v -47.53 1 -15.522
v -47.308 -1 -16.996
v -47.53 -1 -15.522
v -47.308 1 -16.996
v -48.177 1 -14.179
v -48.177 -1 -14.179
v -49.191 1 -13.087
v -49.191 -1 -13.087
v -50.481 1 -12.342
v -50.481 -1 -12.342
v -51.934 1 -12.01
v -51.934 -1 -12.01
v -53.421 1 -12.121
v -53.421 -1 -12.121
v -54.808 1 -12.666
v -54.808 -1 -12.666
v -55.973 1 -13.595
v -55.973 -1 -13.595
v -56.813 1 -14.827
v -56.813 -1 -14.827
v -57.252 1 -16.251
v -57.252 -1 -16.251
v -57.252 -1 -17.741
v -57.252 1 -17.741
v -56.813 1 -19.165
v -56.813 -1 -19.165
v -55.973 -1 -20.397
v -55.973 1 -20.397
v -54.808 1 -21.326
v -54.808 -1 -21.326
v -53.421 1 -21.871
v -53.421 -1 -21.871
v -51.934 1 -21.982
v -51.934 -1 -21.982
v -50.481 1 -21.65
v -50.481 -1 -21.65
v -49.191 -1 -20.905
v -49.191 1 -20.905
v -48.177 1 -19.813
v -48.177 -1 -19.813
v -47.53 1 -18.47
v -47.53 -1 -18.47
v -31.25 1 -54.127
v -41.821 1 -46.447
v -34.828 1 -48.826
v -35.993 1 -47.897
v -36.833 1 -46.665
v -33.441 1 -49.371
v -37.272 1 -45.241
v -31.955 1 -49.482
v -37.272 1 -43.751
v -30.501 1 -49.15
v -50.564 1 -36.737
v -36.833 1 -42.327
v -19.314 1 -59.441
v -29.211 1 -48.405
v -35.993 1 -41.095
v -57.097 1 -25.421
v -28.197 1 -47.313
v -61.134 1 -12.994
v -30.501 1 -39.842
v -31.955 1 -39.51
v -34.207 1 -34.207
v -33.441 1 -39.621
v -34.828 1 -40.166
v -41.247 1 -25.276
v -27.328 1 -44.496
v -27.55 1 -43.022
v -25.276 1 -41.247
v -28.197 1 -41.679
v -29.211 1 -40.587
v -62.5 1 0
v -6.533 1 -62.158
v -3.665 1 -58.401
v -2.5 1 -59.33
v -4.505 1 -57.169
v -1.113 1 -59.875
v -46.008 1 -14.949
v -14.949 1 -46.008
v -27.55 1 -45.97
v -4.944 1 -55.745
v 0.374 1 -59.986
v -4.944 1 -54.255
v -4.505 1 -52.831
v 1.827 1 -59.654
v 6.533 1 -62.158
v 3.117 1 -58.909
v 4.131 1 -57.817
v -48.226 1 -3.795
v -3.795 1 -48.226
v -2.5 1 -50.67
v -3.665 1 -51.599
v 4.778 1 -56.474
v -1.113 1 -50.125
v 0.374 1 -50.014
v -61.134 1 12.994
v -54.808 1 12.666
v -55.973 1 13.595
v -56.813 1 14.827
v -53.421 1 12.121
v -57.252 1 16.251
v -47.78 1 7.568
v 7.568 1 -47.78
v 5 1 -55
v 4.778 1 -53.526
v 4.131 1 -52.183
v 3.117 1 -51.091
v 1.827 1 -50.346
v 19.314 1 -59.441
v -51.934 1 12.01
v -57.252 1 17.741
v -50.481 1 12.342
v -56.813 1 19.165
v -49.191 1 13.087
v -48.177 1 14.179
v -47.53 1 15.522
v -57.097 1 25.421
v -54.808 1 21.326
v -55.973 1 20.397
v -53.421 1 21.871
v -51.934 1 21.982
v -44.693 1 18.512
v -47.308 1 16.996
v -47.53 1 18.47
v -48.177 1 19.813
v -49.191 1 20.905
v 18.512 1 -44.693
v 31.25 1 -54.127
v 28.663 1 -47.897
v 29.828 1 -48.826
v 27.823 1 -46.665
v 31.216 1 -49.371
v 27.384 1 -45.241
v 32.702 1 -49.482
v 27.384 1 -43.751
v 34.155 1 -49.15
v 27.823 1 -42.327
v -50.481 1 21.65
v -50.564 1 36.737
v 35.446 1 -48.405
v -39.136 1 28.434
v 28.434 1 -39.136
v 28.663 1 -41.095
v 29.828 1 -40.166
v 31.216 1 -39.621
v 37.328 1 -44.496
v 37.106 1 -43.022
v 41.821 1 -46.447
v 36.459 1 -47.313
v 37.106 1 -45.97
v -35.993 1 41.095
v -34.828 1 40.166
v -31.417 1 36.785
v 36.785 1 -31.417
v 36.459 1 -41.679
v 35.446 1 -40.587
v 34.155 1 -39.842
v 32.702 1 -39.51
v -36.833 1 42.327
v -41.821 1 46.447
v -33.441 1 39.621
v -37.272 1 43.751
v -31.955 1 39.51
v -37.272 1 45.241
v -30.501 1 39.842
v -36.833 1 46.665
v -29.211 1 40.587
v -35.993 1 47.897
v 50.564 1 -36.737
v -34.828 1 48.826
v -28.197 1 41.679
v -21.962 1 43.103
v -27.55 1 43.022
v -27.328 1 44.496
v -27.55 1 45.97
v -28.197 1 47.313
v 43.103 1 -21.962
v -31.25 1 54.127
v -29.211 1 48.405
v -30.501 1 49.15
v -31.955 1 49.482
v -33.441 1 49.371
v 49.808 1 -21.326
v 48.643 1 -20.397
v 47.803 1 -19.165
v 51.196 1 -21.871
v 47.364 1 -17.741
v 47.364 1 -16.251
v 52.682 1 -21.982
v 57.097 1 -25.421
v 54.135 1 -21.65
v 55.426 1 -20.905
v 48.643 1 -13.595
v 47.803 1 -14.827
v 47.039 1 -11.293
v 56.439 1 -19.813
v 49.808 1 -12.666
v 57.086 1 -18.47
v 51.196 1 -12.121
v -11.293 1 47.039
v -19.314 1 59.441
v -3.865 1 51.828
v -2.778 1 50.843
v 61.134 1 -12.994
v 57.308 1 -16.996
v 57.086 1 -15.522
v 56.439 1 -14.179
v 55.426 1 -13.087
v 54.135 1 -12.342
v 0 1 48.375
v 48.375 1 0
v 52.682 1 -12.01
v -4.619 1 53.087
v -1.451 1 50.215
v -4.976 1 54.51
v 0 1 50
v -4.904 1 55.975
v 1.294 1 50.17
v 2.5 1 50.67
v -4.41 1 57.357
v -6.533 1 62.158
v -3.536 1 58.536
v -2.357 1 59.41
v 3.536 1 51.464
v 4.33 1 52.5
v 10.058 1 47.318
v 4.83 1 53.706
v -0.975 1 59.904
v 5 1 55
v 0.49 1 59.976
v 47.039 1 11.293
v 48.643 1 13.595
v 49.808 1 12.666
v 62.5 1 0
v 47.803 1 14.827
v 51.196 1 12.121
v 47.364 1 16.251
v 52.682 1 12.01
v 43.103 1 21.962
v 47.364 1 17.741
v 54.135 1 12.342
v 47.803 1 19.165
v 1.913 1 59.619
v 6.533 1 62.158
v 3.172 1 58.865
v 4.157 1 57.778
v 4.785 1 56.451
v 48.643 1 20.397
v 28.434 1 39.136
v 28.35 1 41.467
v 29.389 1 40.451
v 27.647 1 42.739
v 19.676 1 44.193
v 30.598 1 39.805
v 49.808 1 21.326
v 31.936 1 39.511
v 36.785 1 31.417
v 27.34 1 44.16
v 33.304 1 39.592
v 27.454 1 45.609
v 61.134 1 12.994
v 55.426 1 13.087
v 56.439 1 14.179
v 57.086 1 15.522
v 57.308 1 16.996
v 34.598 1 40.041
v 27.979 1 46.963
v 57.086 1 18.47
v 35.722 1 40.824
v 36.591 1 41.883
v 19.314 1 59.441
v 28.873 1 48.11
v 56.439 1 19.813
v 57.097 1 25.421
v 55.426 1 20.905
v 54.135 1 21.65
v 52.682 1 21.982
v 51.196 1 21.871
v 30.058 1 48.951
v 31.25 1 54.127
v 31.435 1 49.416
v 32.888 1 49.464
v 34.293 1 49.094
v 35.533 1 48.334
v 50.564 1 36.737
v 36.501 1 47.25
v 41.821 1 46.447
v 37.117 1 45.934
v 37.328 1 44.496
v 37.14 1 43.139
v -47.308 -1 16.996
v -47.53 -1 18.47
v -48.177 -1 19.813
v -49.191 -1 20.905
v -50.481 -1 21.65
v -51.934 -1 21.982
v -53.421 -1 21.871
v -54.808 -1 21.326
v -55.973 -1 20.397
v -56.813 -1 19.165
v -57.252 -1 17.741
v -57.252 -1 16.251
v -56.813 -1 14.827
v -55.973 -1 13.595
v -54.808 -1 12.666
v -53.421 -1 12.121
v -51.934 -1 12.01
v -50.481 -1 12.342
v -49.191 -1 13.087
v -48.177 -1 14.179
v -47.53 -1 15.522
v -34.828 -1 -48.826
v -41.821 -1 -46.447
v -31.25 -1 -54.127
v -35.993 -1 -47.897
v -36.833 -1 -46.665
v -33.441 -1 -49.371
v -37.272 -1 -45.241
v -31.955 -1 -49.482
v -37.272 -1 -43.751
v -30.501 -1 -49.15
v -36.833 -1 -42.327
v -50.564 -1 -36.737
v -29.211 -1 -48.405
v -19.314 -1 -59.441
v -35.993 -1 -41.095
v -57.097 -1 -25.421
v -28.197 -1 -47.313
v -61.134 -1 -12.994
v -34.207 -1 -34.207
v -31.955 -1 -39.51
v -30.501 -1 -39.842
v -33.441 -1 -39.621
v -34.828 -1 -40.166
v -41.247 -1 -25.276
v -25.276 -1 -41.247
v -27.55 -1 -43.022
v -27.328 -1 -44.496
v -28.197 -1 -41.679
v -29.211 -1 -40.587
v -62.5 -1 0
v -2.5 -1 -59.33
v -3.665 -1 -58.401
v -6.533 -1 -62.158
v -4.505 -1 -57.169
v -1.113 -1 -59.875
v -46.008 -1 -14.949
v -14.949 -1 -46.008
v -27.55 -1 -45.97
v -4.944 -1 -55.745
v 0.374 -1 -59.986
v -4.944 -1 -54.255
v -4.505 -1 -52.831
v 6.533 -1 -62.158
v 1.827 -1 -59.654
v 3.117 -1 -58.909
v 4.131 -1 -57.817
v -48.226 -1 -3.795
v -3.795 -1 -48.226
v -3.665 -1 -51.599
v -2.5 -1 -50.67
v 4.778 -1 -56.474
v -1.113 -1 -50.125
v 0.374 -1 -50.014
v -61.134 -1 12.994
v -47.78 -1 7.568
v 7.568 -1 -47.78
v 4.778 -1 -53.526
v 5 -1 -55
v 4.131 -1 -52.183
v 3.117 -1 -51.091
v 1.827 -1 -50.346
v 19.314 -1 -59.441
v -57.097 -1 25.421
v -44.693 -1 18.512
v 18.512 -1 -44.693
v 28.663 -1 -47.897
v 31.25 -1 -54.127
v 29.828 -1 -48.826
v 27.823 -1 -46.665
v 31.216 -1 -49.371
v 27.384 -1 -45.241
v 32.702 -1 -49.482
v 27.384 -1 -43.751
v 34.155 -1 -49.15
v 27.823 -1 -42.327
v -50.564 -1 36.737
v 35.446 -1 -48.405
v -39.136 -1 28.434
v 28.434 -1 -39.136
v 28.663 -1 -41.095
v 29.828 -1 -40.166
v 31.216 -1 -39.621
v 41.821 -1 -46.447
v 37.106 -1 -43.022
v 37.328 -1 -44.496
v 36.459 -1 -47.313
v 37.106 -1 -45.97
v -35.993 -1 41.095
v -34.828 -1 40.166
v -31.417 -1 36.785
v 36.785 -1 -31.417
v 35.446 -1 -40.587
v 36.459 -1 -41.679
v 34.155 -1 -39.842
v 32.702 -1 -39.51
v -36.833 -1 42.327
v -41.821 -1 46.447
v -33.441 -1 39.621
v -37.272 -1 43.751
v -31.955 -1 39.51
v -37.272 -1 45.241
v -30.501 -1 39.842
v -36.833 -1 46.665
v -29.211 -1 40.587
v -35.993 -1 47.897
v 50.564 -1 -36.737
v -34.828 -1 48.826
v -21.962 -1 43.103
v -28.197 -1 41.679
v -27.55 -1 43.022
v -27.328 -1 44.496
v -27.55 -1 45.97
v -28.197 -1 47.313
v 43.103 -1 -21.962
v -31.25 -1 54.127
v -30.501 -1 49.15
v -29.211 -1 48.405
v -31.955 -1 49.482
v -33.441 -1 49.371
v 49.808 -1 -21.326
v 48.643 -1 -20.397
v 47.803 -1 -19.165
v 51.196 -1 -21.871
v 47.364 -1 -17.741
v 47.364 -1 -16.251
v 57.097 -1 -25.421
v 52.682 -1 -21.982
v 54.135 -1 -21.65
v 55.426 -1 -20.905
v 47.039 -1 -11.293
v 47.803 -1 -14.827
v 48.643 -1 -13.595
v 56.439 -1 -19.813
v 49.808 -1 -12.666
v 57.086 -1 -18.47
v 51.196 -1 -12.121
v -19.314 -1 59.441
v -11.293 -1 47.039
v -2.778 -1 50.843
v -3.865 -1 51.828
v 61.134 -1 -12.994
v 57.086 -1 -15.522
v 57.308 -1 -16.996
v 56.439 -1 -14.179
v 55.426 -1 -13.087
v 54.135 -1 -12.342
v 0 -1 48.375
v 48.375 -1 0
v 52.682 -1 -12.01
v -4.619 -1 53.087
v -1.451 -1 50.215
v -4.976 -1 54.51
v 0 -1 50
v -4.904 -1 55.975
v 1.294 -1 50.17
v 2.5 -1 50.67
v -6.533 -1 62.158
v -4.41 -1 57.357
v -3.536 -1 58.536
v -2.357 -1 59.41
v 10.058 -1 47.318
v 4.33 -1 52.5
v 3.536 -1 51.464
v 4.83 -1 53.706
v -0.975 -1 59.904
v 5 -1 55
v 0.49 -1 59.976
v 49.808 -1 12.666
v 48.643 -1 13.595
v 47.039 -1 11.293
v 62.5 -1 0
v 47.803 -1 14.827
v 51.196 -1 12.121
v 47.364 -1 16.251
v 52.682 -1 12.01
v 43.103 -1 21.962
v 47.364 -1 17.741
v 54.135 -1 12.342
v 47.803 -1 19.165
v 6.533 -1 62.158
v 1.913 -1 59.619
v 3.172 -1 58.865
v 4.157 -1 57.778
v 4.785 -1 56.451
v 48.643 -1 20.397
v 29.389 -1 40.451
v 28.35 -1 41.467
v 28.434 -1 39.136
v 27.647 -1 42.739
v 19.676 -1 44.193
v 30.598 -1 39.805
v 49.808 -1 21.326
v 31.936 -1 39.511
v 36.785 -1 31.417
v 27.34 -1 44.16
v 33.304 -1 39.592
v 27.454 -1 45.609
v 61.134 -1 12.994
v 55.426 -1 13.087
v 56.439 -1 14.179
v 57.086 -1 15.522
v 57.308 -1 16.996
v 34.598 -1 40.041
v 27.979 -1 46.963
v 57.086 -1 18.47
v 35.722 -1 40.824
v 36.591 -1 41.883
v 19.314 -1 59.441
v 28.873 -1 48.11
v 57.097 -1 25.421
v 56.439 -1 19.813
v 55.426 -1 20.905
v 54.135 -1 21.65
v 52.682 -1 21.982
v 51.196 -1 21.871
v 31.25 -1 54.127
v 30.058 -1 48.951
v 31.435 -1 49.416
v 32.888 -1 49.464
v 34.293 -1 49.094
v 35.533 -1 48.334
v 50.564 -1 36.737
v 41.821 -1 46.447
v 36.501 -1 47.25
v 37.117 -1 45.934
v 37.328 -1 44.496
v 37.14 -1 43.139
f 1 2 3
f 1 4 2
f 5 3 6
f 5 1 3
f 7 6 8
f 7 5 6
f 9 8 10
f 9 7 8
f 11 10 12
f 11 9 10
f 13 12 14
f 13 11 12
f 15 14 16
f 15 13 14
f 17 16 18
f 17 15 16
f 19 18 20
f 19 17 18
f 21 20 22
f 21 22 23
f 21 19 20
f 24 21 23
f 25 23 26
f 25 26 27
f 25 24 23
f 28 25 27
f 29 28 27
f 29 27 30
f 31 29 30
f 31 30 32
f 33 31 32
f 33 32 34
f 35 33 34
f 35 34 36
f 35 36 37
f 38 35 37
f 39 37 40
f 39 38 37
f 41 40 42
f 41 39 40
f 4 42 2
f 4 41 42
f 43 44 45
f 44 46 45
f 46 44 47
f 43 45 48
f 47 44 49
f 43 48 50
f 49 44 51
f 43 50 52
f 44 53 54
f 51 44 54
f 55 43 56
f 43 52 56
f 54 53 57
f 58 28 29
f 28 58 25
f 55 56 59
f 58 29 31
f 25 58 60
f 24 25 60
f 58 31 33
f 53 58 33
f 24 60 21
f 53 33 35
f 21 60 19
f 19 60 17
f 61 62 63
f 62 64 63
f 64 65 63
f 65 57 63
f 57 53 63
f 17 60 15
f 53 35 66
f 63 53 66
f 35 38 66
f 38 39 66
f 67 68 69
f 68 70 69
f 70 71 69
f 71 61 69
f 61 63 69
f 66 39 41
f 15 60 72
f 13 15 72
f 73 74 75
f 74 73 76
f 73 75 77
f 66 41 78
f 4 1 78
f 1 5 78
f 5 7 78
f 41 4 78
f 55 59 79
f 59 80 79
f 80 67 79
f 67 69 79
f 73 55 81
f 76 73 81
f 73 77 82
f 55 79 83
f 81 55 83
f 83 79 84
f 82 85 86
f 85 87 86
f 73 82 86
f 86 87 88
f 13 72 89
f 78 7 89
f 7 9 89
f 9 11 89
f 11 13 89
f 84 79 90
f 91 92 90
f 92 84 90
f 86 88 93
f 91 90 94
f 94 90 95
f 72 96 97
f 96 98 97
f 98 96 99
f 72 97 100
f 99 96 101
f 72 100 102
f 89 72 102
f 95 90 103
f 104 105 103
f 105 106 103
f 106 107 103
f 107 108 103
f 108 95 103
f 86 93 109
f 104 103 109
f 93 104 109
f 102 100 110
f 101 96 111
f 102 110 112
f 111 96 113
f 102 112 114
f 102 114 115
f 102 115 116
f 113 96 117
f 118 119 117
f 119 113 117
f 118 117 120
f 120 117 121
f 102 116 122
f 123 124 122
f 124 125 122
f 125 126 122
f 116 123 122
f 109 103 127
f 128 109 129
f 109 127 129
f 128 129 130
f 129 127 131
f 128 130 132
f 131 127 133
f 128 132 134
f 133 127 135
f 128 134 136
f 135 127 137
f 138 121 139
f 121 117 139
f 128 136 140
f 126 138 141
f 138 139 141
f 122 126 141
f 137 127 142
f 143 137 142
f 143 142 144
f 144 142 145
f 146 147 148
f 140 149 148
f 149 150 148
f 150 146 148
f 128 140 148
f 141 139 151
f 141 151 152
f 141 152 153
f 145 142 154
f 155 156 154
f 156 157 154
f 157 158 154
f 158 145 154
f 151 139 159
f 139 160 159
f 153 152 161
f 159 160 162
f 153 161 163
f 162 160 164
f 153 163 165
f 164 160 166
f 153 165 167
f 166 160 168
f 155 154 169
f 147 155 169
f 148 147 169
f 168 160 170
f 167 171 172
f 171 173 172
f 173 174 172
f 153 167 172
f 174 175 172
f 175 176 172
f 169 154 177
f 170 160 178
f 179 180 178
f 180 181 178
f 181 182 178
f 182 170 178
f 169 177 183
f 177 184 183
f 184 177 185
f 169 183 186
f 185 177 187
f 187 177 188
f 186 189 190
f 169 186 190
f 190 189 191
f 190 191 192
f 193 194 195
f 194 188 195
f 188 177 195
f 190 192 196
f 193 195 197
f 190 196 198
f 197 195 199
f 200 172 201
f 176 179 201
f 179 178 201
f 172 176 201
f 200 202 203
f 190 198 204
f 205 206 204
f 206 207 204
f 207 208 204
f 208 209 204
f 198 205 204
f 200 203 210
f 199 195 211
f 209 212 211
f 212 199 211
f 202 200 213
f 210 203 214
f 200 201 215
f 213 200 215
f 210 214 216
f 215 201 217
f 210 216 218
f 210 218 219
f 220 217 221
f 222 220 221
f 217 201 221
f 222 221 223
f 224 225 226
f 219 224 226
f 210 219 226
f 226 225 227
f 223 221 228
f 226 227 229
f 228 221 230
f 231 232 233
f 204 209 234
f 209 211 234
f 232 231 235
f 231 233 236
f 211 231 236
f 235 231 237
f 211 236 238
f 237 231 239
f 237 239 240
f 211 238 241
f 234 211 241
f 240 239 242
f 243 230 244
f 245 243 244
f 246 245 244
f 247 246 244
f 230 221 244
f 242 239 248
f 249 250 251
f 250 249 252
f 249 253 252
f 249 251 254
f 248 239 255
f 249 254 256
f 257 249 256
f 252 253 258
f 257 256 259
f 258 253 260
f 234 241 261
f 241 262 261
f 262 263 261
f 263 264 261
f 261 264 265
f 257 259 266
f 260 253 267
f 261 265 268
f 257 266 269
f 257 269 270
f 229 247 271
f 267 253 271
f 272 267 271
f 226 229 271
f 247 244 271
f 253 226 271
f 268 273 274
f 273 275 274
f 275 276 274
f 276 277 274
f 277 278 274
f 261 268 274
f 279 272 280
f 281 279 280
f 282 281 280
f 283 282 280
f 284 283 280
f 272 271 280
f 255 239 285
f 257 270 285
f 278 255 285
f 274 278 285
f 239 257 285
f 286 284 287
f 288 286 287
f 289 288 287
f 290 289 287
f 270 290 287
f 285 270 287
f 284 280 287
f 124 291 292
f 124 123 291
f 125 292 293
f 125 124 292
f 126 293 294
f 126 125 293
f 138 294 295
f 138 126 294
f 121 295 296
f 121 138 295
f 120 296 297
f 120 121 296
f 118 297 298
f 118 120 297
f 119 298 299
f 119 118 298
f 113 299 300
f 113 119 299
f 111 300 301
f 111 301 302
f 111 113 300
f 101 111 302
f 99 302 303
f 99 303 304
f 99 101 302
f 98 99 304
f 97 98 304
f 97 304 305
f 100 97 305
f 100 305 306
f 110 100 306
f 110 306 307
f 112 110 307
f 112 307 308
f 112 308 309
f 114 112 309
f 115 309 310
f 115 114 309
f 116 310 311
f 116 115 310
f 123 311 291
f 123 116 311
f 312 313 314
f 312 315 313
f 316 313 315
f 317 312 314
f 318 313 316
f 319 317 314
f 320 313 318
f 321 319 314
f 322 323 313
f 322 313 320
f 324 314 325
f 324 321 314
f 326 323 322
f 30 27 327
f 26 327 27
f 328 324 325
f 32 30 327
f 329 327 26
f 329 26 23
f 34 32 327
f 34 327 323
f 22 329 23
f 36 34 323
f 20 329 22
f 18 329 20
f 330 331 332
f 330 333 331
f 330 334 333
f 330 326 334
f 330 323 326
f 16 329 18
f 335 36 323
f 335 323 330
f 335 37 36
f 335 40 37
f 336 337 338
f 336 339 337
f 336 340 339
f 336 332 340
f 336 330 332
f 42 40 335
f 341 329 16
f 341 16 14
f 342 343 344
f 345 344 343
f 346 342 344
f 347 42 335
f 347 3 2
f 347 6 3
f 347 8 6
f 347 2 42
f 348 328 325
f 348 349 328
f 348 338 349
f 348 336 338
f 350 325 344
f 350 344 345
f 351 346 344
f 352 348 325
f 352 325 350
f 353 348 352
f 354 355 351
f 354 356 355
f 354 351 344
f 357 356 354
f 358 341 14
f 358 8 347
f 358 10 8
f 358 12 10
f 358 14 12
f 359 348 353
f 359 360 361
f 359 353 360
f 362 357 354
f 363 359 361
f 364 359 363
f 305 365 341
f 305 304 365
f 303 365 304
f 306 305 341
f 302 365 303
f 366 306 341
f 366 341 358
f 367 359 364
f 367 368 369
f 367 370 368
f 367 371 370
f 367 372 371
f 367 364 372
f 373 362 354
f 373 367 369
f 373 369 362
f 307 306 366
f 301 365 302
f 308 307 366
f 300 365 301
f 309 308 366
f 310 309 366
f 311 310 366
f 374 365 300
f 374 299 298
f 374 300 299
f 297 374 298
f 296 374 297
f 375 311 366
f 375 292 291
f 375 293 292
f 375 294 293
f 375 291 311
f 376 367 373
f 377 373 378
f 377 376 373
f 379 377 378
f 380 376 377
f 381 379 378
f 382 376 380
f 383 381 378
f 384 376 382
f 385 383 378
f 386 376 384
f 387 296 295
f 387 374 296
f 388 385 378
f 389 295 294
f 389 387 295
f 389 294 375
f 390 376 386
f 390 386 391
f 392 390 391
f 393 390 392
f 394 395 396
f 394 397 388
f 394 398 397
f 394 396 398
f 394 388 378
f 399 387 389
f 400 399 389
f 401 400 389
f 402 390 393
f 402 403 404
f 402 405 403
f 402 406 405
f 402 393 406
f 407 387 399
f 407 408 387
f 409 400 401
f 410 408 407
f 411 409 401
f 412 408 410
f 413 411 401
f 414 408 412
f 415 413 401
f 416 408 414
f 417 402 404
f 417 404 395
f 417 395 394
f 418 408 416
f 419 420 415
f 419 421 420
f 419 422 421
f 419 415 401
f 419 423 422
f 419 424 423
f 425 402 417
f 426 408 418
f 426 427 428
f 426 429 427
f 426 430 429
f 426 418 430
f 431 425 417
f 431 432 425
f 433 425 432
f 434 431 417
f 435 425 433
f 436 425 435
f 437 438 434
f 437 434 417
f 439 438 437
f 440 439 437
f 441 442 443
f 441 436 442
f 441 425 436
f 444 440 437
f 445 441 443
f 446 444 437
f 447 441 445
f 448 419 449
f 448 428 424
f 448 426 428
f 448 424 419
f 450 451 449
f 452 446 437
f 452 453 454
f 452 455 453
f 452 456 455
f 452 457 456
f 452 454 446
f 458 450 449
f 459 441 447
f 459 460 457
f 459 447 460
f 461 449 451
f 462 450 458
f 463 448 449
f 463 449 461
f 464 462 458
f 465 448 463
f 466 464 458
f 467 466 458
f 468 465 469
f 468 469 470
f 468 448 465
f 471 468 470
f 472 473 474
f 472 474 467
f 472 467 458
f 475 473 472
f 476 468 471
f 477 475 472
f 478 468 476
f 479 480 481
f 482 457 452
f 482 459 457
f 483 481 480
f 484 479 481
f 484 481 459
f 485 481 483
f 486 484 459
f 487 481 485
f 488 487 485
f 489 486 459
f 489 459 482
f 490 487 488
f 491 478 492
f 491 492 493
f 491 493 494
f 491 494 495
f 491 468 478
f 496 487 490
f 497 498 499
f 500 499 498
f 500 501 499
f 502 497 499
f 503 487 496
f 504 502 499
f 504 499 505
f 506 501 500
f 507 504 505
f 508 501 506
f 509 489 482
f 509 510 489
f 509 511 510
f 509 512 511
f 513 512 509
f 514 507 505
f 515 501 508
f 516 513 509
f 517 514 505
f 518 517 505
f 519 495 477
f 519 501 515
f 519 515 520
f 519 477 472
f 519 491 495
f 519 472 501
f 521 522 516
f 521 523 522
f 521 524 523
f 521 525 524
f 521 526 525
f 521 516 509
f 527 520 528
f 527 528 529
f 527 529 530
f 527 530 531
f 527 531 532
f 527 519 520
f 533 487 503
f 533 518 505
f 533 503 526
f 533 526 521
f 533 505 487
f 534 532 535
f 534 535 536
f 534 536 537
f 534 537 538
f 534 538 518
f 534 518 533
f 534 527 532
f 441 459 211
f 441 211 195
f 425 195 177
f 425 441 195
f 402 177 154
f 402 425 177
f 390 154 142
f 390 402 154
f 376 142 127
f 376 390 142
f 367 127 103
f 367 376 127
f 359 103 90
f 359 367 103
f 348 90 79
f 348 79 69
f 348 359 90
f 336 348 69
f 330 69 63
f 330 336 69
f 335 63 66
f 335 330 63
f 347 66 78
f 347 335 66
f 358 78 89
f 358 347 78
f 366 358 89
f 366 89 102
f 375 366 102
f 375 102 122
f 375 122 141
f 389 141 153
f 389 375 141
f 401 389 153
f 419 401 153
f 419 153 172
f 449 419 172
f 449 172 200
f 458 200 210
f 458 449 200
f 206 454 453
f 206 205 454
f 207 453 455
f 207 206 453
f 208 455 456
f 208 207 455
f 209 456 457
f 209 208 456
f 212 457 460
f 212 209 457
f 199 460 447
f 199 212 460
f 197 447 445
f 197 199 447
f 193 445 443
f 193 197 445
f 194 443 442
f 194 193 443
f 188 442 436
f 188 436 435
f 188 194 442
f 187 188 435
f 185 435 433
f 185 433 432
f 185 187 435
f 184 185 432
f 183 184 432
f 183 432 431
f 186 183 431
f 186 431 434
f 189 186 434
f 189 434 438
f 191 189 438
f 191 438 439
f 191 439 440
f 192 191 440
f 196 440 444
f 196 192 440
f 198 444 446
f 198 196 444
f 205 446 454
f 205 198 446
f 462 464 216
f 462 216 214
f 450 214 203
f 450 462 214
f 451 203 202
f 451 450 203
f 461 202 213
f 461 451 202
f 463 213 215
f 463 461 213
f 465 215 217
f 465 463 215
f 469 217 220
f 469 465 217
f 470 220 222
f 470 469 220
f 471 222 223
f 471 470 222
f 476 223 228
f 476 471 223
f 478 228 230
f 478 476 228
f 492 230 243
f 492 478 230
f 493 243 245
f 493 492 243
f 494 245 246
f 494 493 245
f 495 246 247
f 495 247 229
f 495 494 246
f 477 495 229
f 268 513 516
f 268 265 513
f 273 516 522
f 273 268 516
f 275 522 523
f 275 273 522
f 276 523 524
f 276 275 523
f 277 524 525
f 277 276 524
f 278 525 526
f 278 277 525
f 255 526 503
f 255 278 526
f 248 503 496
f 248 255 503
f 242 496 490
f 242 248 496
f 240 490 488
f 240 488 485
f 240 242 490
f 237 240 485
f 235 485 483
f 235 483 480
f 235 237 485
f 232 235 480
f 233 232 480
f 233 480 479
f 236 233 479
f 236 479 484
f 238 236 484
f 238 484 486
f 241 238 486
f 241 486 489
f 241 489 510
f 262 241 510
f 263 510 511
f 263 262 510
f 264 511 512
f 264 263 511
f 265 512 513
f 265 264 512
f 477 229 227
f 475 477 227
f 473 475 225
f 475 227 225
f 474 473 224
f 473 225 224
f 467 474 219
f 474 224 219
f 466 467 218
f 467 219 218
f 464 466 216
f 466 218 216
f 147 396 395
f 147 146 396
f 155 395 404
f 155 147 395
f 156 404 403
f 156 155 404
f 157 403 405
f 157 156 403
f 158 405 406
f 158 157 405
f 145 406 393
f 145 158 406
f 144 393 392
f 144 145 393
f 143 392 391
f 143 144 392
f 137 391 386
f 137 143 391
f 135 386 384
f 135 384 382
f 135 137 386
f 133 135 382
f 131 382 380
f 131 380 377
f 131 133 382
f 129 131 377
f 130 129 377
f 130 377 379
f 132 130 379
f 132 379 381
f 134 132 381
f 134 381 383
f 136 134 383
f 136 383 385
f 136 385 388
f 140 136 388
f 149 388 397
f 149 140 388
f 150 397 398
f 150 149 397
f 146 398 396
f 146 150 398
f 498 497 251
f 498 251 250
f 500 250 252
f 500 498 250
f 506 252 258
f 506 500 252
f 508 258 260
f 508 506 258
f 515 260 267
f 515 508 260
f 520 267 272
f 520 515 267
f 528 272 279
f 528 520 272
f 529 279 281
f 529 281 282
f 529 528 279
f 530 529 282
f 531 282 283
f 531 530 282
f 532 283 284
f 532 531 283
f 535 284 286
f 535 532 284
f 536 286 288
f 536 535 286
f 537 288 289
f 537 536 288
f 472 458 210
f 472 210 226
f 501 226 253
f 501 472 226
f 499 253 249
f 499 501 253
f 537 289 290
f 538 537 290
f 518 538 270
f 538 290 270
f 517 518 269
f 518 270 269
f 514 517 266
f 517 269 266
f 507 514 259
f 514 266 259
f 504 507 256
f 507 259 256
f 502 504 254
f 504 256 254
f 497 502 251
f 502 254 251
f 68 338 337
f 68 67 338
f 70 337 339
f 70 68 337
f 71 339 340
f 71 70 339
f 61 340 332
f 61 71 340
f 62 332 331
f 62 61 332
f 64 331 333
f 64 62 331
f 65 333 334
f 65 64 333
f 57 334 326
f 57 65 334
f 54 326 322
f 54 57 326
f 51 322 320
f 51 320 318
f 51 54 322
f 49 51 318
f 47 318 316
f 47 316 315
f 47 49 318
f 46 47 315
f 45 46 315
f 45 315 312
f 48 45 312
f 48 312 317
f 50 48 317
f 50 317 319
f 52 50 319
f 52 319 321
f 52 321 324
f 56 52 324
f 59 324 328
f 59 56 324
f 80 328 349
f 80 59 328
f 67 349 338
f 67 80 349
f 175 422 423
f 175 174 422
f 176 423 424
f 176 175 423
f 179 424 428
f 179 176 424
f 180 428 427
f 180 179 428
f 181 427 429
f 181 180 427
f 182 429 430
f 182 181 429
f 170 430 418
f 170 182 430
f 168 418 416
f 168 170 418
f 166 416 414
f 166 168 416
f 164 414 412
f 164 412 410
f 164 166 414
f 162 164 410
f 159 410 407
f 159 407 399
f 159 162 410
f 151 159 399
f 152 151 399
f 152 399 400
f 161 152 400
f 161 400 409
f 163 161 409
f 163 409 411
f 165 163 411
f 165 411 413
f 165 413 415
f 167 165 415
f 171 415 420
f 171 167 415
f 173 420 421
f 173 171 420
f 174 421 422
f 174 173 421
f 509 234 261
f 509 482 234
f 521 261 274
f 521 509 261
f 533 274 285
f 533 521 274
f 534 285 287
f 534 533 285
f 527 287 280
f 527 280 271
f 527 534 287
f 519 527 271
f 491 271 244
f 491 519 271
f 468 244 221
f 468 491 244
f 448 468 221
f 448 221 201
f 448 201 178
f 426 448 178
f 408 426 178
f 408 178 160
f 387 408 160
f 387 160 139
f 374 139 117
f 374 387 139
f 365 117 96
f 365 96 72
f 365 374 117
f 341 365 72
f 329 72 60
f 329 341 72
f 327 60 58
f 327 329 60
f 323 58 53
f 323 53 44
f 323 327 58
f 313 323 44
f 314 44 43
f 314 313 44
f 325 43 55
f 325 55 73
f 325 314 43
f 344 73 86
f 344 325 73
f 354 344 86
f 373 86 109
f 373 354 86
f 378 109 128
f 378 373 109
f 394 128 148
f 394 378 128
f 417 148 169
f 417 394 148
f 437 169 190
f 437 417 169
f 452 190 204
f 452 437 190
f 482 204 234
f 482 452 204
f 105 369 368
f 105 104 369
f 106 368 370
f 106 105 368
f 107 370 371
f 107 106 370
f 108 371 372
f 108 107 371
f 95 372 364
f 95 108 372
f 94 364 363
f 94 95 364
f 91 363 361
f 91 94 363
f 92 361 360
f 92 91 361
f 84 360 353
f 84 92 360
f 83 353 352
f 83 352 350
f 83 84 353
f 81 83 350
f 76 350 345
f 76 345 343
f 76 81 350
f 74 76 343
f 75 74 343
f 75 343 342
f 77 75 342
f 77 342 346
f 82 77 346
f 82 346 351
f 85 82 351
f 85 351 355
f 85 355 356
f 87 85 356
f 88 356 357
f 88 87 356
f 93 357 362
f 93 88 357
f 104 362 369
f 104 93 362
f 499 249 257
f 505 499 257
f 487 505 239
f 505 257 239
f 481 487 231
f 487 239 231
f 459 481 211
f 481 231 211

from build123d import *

# Parameters (mm, degrees)
F0_R     = 62.5
F0_R_2   = 5
F1_DEPTH = 1


with BuildPart() as f1:
    # F0 (on Front) → F1 (new body, symmetric)
    with BuildSketch(Plane.XZ):
        with BuildLine():
            ThreePointArc((5, 55), (-3.535534, 58.535534), (0, 50))
            ThreePointArc((0, 50), (3.535534, 51.464466), (5, 55))
        make_face()
        with BuildLine():
            ThreePointArc((37.328189, 44.495935), (30.058236, 48.950967), (29.389263, 40.45085))
            ThreePointArc((29.389263, 40.45085), (34.598141, 40.040902), (37.328189, 44.495935))
        make_face()
        Circle(F0_R)
        with Locations((-32.328189, -44.495935)):
            Circle(F0_R_2, mode=Mode.SUBTRACT)
        with Locations((-52.308108, -16.995935)):
            Circle(F0_R_2, mode=Mode.SUBTRACT)
        with Locations((0, -55)):
            Circle(F0_R_2, mode=Mode.SUBTRACT)
        with Locations((32.328189, -44.495935)):
            Circle(F0_R_2, mode=Mode.SUBTRACT)
        with Locations((52.308108, -16.995935)):
            Circle(F0_R_2, mode=Mode.SUBTRACT)
        with Locations((-52.308108, 16.995935)):
            Circle(F0_R_2, mode=Mode.SUBTRACT)
        with Locations((-32.328189, 44.495935)):
            Circle(F0_R_2, mode=Mode.SUBTRACT)
        with BuildLine():
            ThreePointArc((28.434292, 39.136446), (43.102714, 21.96193), (48.375307, 0))
            ThreePointArc((48.375307, 0), (-34.206508, -34.206508), (0, 48.375307))
            ThreePointArc((0, 48.375307), (14.948792, 46.007651), (28.434292, 39.136446))
        make_face(mode=Mode.SUBTRACT)
        with Locations((52.308108, 16.995935)):
            Circle(F0_R_2, mode=Mode.SUBTRACT)
        with BuildLine():
            ThreePointArc((5, 55), (3.535534, 51.464466), (0, 50))
            ThreePointArc((0, 50), (-3.535534, 58.535534), (5, 55))
        make_face(mode=Mode.SUBTRACT)
        with BuildLine():
            ThreePointArc((37.328189, 44.495935), (34.598141, 40.040902), (29.389263, 40.45085))
            ThreePointArc((29.389263, 40.45085), (30.058236, 48.950967), (37.328189, 44.495935))
        make_face(mode=Mode.SUBTRACT)
    extrude(amount=F1_DEPTH, both=True)


solid = f1.part
